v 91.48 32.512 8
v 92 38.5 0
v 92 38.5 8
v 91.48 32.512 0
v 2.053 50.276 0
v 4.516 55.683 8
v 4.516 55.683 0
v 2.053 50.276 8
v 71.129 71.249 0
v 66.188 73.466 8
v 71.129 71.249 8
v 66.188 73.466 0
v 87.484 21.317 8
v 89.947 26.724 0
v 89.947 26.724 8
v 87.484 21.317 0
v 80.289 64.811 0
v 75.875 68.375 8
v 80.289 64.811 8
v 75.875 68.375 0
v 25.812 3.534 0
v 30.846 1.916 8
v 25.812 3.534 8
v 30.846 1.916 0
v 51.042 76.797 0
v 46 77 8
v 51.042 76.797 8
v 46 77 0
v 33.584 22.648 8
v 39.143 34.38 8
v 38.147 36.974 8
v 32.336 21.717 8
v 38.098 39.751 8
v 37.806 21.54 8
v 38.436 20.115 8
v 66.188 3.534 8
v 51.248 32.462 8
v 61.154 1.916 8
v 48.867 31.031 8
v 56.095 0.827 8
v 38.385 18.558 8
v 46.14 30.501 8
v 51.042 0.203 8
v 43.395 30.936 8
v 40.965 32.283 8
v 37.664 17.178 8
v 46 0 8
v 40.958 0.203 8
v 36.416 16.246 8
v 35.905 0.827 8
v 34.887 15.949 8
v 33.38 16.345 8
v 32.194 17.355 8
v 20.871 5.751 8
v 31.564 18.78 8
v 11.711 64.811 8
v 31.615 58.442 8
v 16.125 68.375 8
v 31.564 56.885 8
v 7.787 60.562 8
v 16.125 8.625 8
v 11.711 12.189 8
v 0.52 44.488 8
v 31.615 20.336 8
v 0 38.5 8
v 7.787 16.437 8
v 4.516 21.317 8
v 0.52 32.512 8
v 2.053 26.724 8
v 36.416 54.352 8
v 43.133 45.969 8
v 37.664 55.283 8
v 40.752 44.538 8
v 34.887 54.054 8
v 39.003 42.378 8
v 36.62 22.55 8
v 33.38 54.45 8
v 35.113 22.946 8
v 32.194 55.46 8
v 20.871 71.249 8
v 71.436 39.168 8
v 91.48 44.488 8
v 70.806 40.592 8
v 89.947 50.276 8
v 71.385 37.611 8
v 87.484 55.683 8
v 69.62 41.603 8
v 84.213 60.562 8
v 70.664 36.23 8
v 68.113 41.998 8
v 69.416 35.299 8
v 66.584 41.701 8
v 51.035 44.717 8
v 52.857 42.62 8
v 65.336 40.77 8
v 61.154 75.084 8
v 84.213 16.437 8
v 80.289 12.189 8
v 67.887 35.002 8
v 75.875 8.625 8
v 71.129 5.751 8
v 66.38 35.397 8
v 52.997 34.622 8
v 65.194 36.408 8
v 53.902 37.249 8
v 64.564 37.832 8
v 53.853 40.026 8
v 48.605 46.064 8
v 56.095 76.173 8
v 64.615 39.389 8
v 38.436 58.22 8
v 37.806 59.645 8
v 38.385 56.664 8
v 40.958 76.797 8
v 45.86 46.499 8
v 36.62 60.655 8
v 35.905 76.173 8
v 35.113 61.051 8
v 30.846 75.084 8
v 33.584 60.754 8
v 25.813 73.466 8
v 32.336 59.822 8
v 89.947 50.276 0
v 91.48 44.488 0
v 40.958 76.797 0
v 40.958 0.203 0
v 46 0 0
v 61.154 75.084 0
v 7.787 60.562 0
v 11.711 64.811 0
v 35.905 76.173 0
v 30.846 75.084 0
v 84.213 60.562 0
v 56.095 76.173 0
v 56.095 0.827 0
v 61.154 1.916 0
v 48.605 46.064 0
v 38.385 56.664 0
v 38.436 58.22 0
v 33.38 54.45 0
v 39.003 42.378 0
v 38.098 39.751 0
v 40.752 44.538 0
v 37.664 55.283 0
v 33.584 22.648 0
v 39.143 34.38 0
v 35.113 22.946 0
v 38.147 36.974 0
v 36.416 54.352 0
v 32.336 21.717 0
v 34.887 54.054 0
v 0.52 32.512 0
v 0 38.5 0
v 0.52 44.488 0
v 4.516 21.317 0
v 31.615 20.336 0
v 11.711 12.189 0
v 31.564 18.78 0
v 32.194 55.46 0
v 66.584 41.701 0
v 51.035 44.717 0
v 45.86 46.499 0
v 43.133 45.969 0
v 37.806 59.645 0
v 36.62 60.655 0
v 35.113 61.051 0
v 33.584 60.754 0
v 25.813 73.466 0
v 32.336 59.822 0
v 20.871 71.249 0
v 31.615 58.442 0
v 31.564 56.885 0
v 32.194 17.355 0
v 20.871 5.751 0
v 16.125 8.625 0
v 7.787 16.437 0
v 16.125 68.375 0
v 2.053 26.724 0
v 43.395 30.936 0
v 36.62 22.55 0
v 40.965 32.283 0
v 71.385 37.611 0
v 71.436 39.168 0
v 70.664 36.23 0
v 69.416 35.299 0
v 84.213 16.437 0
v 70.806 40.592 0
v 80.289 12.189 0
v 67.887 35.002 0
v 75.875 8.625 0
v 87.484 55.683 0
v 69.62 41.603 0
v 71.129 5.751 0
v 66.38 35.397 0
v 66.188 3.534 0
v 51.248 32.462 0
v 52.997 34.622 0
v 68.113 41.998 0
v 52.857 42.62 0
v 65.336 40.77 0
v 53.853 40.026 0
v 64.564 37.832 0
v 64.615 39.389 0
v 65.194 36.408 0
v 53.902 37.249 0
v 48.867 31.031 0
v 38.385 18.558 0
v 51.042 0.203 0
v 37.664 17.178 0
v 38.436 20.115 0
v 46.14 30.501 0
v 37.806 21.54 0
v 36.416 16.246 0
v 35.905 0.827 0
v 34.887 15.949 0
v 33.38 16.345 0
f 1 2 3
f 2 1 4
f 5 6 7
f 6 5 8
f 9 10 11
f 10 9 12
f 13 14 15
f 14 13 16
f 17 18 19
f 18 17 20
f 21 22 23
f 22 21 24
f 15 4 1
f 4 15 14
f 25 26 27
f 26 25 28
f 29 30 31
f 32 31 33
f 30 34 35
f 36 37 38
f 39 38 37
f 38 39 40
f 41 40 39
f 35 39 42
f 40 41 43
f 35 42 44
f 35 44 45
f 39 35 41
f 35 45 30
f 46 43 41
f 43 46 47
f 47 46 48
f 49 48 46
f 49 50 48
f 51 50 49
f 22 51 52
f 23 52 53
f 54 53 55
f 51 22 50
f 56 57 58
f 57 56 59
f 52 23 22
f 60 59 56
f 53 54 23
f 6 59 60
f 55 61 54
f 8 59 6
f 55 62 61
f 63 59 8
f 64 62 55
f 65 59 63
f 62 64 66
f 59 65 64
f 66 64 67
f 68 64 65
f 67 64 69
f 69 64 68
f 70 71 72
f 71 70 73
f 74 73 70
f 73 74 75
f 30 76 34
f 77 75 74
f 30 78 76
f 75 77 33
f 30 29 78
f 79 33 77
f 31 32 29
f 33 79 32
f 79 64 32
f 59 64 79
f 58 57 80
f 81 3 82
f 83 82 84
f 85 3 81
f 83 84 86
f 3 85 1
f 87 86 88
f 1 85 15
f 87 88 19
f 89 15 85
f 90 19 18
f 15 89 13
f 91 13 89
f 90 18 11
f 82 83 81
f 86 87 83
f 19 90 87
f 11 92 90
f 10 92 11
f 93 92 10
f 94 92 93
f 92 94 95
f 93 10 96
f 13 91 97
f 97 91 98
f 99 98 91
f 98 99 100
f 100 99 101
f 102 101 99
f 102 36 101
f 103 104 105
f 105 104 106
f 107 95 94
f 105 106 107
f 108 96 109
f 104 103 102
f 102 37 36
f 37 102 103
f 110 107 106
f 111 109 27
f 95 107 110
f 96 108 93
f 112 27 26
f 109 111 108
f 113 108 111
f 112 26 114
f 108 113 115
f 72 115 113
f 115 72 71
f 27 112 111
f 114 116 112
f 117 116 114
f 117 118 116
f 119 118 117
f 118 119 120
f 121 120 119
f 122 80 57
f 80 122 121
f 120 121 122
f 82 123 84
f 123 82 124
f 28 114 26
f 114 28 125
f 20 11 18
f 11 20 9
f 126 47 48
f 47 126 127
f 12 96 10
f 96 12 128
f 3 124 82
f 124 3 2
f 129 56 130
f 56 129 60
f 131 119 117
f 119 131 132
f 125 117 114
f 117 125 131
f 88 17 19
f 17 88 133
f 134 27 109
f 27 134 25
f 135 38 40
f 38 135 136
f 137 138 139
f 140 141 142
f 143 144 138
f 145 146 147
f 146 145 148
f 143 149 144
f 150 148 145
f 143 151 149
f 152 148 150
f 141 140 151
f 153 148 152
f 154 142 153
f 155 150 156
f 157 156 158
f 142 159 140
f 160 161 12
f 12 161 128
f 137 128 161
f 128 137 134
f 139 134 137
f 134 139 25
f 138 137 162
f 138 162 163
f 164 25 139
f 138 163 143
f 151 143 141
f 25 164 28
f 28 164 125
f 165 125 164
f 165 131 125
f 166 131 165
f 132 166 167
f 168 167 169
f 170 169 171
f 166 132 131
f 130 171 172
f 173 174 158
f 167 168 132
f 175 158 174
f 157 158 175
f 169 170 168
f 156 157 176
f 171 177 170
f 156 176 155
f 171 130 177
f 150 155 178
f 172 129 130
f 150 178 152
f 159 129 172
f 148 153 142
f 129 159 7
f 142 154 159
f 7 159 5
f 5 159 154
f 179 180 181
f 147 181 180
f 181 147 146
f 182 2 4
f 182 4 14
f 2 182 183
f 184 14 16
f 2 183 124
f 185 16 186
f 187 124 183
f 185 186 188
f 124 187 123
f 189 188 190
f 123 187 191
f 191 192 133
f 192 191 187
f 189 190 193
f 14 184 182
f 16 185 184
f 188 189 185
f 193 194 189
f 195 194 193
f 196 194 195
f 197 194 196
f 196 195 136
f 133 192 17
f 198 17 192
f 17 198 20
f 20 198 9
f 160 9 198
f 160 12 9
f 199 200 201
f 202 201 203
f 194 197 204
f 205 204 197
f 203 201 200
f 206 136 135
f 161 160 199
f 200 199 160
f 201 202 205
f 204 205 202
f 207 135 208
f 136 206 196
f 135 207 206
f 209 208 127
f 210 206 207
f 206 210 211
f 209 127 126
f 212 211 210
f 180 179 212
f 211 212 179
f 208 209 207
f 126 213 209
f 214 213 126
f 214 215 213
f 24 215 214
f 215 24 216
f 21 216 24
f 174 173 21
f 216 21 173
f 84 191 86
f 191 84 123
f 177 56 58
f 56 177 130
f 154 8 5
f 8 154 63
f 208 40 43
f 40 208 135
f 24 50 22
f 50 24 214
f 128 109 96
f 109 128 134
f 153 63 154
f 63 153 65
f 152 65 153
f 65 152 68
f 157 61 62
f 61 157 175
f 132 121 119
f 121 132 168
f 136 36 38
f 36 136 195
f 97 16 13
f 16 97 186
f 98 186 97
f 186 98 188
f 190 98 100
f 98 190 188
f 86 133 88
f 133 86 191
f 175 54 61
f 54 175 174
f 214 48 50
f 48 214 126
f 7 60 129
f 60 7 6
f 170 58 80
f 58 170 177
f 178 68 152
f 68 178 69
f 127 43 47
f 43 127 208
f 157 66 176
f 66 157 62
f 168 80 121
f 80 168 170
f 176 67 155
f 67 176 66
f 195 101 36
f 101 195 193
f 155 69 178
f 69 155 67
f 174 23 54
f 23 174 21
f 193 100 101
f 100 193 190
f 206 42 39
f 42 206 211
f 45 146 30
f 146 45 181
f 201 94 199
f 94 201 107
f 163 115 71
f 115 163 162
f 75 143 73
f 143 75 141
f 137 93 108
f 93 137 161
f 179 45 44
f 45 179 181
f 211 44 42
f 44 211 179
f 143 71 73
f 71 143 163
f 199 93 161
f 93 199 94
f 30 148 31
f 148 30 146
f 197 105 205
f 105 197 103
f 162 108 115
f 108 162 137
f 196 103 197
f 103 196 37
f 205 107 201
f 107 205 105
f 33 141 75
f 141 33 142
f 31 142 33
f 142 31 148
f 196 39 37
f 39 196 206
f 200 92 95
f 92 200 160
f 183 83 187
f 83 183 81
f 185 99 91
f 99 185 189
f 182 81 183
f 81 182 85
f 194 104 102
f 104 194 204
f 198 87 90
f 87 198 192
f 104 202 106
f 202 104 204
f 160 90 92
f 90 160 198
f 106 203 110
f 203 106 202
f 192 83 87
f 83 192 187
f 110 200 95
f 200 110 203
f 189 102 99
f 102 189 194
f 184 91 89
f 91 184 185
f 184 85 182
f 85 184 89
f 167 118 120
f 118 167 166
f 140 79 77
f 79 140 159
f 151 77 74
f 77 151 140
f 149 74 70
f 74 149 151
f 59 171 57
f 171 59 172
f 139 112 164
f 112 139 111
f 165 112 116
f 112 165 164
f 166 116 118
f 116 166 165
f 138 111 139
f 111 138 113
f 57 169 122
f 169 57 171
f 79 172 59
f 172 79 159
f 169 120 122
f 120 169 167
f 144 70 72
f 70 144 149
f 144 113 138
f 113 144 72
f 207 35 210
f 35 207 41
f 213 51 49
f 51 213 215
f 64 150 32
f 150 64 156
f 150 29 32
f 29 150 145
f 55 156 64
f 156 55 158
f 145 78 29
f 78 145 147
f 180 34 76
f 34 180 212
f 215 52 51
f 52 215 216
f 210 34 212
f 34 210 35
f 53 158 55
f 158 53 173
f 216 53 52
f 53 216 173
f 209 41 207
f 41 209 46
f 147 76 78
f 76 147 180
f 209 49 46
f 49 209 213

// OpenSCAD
$fn = 32;

// ----------------------------------------------------------------------
// Cam plate: double_lobe cam, base R36
// ----------------------------------------------------------------------

// --- parameters (mm) ---
base_r = 36;              // base circle radius
lobe_h = 10;              // cam lobe rise
bore_r = 8;               // shaft bore radius
plate_t = 8;              // plate thickness, Z (extrusion height)
ring_r = 22;              // lightening ring radius
bolt_r = 3.5;             // lightening hole radius

profile = [[92, 38.5], [91.48, 44.488], [89.947, 50.276], [87.484, 55.683], [84.213, 60.562], [80.289, 64.811], [75.875, 68.375], [71.129, 71.249], [66.188, 73.466], [61.154, 75.084], [56.095, 76.173], [51.042, 76.797], [46, 77], [40.958, 76.797], [35.905, 76.173], [30.846, 75.084], [25.813, 73.466], [20.871, 71.249], [16.125, 68.375], [11.711, 64.811], [7.787, 60.562], [4.516, 55.683], [2.053, 50.276], [0.52, 44.488], [0, 38.5], [0.52, 32.512], [2.053, 26.724], [4.516, 21.317], [7.787, 16.437], [11.711, 12.189], [16.125, 8.625], [20.871, 5.751], [25.812, 3.534], [30.846, 1.916], [35.905, 0.827], [40.958, 0.203], [46, 0], [51.042, 0.203], [56.095, 0.827], [61.154, 1.916], [66.188, 3.534], [71.129, 5.751], [75.875, 8.625], [80.289, 12.189], [84.213, 16.437], [87.484, 21.317], [89.947, 26.724], [91.48, 32.512]];  // primary outline, 48 points, counter clockwise
void_1 = [[53.853, 40.026], [52.857, 42.62], [51.035, 44.717], [48.605, 46.064], [45.86, 46.499], [43.133, 45.969], [40.752, 44.538], [39.003, 42.378], [38.098, 39.751], [38.147, 36.974], [39.143, 34.38], [40.965, 32.283], [43.395, 30.936], [46.14, 30.501], [48.867, 31.031], [51.248, 32.462], [52.997, 34.622], [53.902, 37.249]];  // shaft bore, 18 points
void_2 = [[71.436, 39.168], [70.806, 40.592], [69.62, 41.603], [68.113, 41.998], [66.584, 41.701], [65.336, 40.77], [64.615, 39.389], [64.564, 37.832], [65.194, 36.408], [66.38, 35.397], [67.887, 35.002], [69.416, 35.299], [70.664, 36.23], [71.385, 37.611]];  // lightening hole 1, 14 points
void_3 = [[38.436, 58.22], [37.806, 59.645], [36.62, 60.655], [35.113, 61.051], [33.584, 60.754], [32.336, 59.822], [31.615, 58.442], [31.564, 56.885], [32.194, 55.46], [33.38, 54.45], [34.887, 54.054], [36.416, 54.352], [37.664, 55.283], [38.385, 56.664]];  // lightening hole 2, 14 points
void_4 = [[38.436, 20.115], [37.806, 21.54], [36.62, 22.55], [35.113, 22.946], [33.584, 22.648], [32.336, 21.717], [31.615, 20.336], [31.564, 18.78], [32.194, 17.355], [33.38, 16.345], [34.887, 15.949], [36.416, 16.246], [37.664, 17.178], [38.385, 18.558]];  // lightening hole 3, 14 points

// --- the one profile operation ---
difference() {
  linear_extrude(height = plate_t) polygon(points = profile);
  translate([0, 0, -1])
    linear_extrude(height = plate_t + 2) polygon(points = void_1);
  translate([0, 0, -1])
    linear_extrude(height = plate_t + 2) polygon(points = void_2);
  translate([0, 0, -1])
    linear_extrude(height = plate_t + 2) polygon(points = void_3);
  translate([0, 0, -1])
    linear_extrude(height = plate_t + 2) polygon(points = void_4);
}
